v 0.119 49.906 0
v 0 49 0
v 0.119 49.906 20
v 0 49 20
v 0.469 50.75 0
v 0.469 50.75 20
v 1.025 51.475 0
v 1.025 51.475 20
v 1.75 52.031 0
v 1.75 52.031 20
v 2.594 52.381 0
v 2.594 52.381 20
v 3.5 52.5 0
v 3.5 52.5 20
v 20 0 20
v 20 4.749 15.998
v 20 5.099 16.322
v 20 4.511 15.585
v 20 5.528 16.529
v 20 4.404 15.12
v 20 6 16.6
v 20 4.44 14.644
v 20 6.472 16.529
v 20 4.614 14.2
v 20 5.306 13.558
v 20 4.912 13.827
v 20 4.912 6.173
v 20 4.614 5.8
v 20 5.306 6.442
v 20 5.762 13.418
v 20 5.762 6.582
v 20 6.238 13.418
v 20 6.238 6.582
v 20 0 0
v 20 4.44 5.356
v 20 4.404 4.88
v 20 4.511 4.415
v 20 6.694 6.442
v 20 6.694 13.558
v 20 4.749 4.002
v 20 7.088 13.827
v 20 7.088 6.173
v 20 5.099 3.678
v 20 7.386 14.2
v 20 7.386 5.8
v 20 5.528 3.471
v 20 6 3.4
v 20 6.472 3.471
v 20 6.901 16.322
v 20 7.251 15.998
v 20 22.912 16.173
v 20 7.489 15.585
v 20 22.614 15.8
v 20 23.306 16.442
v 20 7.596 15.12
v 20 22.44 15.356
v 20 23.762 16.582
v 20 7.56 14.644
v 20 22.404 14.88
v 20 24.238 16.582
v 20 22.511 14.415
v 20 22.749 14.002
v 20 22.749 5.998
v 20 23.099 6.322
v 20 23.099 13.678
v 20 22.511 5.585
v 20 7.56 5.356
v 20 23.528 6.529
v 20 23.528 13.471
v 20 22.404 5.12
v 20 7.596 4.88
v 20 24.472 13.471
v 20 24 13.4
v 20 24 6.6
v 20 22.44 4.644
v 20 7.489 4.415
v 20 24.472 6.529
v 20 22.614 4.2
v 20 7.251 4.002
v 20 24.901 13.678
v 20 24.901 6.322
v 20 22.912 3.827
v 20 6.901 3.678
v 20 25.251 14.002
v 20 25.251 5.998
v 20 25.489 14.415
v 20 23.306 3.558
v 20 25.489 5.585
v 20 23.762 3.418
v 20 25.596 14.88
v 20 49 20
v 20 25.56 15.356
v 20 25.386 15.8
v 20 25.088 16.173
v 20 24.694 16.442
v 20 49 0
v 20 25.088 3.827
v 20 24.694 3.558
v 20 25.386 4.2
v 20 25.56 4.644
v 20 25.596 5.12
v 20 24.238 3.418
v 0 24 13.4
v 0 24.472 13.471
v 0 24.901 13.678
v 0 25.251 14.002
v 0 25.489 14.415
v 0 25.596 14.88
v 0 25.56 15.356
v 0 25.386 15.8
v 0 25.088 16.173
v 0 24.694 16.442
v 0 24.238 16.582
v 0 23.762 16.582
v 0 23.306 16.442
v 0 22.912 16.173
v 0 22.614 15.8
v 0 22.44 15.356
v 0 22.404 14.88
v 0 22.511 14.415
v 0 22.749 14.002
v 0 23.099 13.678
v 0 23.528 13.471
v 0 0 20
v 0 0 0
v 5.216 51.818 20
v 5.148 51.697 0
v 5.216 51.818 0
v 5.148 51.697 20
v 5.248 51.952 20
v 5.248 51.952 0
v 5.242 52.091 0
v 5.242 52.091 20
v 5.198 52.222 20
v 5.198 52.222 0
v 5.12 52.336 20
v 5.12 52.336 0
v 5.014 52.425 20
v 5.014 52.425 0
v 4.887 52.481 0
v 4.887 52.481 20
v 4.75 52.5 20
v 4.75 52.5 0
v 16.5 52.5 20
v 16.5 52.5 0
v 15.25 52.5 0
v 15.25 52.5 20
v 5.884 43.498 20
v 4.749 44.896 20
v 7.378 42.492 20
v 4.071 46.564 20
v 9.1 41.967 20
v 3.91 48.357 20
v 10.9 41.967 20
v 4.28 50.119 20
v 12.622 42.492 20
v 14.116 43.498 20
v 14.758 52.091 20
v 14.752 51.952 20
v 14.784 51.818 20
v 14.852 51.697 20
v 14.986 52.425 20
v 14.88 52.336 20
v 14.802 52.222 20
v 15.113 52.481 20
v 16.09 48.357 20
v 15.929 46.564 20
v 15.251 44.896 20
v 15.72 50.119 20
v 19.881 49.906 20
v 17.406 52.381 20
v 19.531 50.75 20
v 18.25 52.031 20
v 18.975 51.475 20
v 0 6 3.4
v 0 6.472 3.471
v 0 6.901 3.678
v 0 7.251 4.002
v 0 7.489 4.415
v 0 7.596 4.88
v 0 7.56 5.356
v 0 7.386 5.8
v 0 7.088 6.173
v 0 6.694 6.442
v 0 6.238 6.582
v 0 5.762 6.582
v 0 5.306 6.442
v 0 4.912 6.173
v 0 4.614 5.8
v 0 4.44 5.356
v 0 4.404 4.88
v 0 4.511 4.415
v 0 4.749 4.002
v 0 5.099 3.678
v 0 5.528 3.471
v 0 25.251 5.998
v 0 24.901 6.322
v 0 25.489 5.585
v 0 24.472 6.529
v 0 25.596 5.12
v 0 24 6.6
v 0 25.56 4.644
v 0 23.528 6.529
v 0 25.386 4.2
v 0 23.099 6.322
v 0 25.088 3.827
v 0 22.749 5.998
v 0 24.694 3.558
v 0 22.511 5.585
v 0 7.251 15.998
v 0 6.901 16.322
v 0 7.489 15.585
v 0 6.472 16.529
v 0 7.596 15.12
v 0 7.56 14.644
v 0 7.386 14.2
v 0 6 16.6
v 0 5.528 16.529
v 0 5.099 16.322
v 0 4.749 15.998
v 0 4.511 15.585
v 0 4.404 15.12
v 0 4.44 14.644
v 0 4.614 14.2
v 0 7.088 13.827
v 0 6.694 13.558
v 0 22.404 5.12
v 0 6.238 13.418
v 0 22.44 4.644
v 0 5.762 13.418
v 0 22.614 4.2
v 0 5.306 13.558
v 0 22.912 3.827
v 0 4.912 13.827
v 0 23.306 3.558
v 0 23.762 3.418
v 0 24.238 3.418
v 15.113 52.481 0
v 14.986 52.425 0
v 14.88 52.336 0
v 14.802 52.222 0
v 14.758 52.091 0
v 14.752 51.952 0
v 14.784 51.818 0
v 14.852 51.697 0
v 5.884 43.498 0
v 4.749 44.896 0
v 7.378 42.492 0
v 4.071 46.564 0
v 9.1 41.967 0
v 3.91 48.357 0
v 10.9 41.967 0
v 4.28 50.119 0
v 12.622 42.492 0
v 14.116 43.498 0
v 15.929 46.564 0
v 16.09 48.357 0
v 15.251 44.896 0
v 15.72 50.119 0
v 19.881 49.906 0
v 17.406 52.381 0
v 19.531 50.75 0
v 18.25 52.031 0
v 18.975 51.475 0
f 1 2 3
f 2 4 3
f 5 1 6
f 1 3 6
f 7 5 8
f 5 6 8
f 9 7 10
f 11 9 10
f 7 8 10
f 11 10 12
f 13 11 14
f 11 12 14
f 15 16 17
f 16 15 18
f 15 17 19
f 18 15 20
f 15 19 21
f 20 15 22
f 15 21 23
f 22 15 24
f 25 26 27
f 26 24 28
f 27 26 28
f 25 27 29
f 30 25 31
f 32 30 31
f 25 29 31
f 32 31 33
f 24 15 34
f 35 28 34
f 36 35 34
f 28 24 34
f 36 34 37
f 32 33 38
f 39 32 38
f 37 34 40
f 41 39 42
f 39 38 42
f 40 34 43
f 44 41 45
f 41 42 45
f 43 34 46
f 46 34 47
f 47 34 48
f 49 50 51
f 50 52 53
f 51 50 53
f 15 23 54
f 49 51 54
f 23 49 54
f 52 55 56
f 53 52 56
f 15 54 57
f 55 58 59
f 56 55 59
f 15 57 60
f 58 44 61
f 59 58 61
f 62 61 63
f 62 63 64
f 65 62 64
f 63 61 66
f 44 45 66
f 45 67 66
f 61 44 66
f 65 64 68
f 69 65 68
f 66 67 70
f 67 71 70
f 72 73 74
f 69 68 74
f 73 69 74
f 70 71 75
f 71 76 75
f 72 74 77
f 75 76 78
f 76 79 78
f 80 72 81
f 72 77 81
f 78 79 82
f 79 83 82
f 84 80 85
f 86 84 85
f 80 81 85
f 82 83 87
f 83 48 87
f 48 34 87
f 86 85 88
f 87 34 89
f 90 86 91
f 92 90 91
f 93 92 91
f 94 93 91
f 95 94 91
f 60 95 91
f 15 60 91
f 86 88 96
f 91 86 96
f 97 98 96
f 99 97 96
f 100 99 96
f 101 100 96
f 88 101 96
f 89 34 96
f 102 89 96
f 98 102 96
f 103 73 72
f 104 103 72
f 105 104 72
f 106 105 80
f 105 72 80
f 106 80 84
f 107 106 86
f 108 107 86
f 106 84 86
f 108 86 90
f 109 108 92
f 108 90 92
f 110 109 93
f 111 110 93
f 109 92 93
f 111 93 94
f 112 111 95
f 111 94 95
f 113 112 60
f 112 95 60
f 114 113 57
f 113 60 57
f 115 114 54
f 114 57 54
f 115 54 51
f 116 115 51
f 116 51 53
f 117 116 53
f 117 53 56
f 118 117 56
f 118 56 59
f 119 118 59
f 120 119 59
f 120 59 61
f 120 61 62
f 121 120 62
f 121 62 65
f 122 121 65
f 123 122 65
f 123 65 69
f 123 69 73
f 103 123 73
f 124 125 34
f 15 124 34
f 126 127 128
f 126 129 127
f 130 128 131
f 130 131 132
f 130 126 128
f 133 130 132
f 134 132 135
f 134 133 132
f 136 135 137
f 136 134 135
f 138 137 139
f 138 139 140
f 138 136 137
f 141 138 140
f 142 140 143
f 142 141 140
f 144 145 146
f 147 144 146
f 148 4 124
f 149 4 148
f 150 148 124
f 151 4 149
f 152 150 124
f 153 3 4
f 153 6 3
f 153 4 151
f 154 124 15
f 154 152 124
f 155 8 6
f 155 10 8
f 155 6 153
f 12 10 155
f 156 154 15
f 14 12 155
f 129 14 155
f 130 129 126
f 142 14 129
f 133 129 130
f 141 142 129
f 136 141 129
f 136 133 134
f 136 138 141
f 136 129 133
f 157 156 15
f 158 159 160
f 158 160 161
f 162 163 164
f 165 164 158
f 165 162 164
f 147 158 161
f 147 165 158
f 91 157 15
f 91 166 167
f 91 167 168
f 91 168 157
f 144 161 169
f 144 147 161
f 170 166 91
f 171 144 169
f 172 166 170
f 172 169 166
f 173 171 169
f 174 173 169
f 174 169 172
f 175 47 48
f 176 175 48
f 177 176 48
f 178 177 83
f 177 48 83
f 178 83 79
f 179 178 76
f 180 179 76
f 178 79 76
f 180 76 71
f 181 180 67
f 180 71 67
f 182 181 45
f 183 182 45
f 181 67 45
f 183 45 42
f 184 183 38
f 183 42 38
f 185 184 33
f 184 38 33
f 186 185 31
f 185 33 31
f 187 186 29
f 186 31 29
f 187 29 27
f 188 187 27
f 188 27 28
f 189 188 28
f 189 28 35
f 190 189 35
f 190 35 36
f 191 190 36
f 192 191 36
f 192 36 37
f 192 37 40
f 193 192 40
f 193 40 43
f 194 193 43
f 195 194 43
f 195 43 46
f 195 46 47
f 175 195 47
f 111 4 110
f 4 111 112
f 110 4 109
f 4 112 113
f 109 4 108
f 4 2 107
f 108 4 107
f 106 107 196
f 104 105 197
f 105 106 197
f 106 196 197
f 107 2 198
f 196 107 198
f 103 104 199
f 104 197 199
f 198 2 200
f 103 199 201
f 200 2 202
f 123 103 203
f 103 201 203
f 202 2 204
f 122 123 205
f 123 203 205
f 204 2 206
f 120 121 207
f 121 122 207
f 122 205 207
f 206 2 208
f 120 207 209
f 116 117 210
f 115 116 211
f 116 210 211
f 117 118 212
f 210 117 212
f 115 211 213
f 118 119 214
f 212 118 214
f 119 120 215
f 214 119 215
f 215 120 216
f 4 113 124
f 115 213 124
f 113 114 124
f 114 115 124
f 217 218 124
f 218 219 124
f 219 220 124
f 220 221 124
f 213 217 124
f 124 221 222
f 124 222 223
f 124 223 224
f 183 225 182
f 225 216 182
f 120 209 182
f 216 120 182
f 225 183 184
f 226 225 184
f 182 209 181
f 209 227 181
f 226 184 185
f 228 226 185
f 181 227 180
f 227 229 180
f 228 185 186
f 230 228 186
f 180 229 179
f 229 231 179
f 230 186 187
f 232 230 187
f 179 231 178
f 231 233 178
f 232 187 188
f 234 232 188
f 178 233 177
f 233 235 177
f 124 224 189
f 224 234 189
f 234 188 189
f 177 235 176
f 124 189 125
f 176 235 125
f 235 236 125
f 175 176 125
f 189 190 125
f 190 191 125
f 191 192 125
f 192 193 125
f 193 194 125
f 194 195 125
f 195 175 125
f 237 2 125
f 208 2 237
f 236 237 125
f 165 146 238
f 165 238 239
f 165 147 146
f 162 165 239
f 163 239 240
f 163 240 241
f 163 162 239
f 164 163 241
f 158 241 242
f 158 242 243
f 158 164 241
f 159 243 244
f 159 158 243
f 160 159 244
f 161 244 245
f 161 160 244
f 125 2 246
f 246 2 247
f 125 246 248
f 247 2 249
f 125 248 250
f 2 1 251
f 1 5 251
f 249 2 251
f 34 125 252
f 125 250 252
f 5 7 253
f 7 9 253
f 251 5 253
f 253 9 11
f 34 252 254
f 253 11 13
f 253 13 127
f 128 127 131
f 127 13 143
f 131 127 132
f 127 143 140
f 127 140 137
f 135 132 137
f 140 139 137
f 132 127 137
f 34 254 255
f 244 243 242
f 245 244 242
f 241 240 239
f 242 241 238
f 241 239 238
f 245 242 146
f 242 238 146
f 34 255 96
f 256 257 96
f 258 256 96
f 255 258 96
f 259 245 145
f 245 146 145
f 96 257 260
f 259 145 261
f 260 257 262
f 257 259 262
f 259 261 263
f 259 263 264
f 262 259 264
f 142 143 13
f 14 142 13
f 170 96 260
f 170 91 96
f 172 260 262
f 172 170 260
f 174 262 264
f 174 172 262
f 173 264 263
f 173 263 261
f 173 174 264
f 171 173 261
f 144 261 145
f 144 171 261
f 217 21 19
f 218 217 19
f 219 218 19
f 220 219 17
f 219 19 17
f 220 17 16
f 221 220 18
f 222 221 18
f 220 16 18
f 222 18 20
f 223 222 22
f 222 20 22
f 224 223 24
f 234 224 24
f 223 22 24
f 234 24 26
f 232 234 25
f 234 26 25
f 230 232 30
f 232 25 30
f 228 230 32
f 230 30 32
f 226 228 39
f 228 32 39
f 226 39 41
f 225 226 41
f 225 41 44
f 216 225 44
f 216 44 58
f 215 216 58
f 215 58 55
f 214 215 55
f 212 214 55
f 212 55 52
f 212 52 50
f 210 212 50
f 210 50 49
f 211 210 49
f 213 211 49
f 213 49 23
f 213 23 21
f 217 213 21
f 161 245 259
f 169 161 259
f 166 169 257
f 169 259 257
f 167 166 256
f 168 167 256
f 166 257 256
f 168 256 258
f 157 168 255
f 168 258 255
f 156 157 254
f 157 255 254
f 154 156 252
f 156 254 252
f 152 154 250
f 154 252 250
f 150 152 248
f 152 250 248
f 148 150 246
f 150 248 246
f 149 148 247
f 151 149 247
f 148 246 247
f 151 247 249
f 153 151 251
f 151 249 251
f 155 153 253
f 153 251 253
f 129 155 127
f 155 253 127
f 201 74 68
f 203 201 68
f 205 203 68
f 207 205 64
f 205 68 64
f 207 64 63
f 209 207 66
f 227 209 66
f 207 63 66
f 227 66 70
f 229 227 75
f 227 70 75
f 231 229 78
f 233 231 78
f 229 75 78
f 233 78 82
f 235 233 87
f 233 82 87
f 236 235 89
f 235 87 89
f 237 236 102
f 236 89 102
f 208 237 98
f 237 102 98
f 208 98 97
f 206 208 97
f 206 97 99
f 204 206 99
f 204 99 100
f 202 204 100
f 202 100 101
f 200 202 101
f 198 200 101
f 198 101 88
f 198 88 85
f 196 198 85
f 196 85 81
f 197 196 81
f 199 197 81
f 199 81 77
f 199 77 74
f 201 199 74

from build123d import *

# Parameters (mm, degrees)
EXTRUDE_1_DEPTH     = 20
SKETCH_2_R          = 1.6
CUT_EXTRUDE_1_DEPTH = 60.634302209
FILLET_1_R          = 3.5
FILLET_2_R          = 0.5


with BuildPart() as part:
    # 草图1 → 凸台-拉伸1 (new body)
    with BuildSketch(Plane.XY):
        with BuildLine():
            Line((0, 0), (20, 0))
            Line((20, 0), (20, 30))
            Line((20, 30), (20, 52.5))
            Line((20, 52.5), (14.118252056, 52.5))
            ThreePointArc((14.118252056, 52.5), (10, 41.9), (5.881747944, 52.5))
            Line((5.881747944, 52.5), (0, 52.5))
            Line((0, 52.5), (0, 30))
            Line((0, 30), (0, 0))
        make_face()
    extrude(amount=EXTRUDE_1_DEPTH)

    # 草图2 → 切除-拉伸1 (cut, through all)
    with BuildSketch(Plane(origin=(20, 0, 0), x_dir=(0, 0, -1), z_dir=(1, 0, 0))):
        with Locations((-15, 24)):
            Circle(SKETCH_2_R)
        with Locations(Location((-15, 6, 0), (0, 0, 180))):
            Circle(SKETCH_2_R)
        with Locations((-5, 6)):
            Circle(SKETCH_2_R)
        with Locations(Location((-5, 24, 0), (0, 0, 180))):
            Circle(SKETCH_2_R)
    extrude(amount=-CUT_EXTRUDE_1_DEPTH, mode=Mode.SUBTRACT)

    # 圆角1
    fillet_1_edges = [part.edges().sort_by_distance(p)[0] for p in [
        (0, 52.5, 10),
        (20, 52.5, 10),
    ]]
    fillet(fillet_1_edges, radius=FILLET_1_R)

    # 圆角2
    fillet_2_edges = [part.edges().sort_by_distance(p)[0] for p in [
        (5.881747944, 52.5, 10),
        (14.118252056, 52.5, 10),
    ]]
    fillet(fillet_2_edges, radius=FILLET_2_R)


solid = part.part
